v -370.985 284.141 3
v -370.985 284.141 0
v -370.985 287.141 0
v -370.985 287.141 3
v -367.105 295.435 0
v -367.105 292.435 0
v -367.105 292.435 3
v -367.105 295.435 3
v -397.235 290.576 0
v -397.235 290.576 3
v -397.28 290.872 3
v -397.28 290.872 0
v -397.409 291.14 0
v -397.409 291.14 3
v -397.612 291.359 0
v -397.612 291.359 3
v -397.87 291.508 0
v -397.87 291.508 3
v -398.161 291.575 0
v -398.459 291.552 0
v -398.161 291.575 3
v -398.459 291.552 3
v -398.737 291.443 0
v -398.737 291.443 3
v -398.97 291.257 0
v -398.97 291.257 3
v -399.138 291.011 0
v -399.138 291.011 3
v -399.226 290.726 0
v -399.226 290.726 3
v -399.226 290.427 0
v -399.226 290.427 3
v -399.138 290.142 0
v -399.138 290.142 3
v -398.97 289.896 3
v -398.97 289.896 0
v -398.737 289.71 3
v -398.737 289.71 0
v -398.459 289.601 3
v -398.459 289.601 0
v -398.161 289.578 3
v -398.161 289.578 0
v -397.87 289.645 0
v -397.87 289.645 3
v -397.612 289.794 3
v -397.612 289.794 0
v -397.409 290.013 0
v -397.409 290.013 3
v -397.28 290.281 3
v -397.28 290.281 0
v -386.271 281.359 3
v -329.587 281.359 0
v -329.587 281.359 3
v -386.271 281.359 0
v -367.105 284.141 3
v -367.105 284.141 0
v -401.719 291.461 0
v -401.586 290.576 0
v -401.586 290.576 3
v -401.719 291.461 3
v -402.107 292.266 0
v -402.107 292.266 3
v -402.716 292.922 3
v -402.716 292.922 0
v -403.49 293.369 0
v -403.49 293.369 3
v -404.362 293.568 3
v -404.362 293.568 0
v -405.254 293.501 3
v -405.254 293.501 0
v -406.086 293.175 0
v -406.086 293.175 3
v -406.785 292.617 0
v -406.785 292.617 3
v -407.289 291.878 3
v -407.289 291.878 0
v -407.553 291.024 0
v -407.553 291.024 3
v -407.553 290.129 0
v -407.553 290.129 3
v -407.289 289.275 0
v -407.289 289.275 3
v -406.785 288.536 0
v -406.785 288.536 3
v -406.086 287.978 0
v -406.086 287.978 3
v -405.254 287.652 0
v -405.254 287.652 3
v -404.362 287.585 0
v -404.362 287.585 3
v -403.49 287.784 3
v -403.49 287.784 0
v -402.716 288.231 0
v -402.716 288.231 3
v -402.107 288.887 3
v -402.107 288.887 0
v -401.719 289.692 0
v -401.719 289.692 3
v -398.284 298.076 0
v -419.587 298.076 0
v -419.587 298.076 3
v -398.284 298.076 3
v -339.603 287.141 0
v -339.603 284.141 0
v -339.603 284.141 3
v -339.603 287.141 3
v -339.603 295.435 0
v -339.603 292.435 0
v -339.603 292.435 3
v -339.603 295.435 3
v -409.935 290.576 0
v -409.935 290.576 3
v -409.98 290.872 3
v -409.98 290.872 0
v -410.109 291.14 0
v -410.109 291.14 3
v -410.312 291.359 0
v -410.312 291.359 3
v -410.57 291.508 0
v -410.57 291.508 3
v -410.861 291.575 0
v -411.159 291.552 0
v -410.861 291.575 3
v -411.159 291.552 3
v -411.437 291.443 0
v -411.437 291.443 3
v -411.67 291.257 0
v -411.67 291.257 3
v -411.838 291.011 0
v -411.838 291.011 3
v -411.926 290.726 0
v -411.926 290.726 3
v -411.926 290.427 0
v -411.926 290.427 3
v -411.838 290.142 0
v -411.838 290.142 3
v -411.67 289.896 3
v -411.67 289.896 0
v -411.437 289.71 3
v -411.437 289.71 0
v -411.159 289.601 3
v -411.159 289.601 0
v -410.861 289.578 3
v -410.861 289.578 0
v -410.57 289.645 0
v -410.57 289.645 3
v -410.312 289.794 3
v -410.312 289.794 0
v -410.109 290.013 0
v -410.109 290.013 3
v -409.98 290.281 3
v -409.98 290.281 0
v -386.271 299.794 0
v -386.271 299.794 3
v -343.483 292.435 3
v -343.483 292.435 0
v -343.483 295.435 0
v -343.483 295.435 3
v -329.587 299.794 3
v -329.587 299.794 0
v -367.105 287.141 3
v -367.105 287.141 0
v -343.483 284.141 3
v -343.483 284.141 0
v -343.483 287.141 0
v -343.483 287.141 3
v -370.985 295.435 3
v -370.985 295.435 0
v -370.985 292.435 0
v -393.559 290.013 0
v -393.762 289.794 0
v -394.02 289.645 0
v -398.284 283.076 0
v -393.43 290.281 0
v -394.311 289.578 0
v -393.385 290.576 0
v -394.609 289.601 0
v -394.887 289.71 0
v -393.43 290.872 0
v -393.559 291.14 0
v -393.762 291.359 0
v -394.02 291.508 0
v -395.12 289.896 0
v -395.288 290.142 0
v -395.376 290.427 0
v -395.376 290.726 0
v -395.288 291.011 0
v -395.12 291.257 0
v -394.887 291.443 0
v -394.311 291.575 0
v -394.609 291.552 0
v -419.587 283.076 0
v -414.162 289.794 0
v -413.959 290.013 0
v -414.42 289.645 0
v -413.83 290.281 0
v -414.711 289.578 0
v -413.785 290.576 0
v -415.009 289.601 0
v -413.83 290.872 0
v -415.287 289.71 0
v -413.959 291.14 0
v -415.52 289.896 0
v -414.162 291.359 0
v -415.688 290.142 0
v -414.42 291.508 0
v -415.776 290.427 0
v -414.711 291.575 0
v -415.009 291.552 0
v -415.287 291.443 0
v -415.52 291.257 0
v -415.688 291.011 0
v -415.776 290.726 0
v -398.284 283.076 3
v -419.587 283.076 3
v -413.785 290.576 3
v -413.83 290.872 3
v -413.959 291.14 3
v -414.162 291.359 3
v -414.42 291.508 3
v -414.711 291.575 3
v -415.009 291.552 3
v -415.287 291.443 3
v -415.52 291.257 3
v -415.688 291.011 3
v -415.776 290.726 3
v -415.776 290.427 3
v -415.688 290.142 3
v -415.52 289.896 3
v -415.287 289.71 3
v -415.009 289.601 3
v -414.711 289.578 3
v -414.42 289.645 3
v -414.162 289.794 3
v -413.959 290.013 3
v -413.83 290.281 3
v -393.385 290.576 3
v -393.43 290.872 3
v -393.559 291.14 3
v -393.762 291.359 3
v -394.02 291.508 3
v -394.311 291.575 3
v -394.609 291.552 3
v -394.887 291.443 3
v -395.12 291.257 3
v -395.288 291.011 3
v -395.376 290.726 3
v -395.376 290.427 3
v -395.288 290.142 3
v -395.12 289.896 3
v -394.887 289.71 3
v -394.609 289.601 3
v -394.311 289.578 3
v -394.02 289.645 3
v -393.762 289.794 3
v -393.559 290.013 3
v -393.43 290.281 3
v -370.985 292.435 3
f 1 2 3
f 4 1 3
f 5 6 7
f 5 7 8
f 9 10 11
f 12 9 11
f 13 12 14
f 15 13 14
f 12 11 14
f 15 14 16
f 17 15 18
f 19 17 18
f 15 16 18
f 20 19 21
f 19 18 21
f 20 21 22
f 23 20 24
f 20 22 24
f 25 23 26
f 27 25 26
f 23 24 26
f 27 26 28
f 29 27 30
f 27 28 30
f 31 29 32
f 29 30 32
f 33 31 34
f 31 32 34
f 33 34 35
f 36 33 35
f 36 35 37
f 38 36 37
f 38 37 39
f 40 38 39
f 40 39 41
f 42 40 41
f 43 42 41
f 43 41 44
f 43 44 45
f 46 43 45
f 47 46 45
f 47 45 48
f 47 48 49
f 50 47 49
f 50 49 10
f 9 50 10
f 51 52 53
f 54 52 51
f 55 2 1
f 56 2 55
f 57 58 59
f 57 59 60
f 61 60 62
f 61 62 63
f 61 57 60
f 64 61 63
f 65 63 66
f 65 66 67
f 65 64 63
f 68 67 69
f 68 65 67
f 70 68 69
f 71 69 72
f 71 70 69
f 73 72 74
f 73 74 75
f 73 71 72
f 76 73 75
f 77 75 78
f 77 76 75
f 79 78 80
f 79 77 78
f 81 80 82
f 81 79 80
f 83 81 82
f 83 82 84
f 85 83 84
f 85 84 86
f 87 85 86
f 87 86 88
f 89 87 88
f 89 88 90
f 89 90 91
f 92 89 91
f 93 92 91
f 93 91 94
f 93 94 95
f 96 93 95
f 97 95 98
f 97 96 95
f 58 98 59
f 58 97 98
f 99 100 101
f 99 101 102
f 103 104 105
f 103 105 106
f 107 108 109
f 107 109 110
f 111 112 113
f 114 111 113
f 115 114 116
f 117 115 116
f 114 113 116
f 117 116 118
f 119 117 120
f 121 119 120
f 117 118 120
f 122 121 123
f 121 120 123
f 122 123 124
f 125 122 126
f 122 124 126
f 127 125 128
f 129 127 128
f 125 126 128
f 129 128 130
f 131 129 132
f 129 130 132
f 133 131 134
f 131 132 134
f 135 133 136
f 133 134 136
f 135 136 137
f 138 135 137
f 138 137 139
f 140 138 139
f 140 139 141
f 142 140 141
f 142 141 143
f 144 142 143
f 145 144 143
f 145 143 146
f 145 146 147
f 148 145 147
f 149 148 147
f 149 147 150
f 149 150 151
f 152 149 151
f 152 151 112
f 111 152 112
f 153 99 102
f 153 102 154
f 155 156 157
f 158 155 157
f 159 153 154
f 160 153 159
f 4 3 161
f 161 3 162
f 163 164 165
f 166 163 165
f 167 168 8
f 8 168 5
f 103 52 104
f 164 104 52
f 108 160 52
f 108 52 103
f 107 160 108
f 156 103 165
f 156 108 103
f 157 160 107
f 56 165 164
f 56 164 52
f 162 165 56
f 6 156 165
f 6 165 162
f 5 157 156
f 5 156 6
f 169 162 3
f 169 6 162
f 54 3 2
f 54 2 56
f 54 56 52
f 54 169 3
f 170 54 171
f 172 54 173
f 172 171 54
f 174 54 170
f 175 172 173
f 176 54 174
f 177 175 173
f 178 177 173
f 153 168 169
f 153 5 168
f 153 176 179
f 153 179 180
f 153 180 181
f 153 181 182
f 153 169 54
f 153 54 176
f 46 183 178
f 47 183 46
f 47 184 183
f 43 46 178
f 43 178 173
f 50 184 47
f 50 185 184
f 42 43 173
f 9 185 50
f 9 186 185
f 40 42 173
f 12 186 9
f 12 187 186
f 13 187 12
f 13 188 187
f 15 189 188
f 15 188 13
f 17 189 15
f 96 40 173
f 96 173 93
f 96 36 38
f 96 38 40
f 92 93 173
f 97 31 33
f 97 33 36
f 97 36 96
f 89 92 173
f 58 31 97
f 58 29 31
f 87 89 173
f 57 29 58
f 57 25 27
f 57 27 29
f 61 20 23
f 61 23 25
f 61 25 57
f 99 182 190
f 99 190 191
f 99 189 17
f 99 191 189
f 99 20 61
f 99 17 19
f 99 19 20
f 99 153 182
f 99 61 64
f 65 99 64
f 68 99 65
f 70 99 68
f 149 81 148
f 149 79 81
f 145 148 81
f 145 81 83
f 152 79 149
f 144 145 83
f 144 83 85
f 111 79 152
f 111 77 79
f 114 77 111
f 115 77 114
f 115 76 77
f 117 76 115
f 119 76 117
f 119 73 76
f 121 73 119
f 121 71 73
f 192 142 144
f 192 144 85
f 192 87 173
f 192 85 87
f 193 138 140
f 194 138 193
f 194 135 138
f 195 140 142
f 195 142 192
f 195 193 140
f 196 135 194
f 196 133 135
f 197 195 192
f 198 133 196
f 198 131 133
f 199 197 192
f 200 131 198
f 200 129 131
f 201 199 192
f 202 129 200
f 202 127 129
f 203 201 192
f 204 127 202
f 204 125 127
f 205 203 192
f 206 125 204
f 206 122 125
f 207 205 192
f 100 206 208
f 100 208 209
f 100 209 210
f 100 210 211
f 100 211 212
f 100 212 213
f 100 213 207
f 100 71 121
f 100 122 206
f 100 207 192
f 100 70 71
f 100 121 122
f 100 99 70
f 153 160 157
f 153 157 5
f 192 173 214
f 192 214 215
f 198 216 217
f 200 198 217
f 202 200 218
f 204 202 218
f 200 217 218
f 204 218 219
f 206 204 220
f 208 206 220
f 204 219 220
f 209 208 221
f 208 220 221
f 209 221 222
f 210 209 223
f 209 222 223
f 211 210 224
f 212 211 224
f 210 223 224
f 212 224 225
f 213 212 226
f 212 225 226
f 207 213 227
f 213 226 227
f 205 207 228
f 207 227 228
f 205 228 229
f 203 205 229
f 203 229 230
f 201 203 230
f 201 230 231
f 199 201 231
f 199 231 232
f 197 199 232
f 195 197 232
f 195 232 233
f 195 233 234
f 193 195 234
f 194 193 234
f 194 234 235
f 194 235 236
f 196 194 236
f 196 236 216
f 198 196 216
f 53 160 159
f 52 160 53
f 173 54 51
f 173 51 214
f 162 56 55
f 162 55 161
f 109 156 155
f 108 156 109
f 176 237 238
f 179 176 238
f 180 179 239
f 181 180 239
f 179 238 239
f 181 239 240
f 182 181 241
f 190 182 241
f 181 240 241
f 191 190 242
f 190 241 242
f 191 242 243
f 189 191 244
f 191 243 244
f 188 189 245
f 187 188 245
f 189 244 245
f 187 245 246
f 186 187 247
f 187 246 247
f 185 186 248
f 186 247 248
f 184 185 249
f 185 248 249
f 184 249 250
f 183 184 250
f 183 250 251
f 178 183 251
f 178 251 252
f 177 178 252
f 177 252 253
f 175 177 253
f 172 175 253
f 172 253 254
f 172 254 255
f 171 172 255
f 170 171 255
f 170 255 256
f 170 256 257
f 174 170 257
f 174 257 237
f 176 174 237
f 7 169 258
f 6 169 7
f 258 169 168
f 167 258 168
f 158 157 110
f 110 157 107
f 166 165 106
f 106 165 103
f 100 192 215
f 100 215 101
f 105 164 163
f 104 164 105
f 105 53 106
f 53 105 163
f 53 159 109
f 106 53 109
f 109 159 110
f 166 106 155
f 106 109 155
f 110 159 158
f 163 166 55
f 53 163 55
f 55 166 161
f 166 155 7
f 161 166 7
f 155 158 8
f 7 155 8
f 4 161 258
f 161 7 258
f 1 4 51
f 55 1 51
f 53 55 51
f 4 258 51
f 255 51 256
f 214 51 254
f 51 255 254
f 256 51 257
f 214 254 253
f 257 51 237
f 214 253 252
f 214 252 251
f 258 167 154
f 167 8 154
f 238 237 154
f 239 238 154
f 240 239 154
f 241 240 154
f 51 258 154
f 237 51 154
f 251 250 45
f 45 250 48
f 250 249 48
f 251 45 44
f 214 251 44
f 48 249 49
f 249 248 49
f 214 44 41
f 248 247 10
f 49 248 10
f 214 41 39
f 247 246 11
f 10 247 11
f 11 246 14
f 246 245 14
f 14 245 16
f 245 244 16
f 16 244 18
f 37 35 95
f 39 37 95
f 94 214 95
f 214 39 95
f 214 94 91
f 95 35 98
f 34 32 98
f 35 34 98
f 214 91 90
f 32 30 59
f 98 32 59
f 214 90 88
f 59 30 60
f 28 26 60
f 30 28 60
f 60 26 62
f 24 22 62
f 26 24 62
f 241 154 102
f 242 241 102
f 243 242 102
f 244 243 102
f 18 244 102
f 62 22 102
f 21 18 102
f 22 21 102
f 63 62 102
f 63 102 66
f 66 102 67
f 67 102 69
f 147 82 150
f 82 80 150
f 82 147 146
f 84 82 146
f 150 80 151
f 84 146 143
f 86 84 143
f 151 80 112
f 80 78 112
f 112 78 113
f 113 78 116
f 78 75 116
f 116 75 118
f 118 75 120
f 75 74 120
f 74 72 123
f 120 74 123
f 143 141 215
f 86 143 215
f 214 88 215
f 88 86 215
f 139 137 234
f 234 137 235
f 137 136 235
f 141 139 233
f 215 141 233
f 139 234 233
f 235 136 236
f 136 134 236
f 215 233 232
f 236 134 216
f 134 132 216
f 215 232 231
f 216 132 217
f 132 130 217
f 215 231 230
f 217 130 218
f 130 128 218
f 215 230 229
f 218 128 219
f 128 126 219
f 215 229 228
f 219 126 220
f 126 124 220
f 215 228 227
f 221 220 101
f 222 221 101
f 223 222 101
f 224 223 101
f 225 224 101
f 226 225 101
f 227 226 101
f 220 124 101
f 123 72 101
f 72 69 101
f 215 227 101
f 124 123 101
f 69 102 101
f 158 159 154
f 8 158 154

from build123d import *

# Parameters (mm, degrees)
SKETCH1_R           = 3
SKETCH1_W           = 3.88
SKETCH1_H           = 3
BOSS_EXTRUDE1_DEPTH = 3
SKETCH2_R           = 1.0009
CUT_EXTRUDE1_DEPTH  = 516.692890771


with BuildPart() as part:
    # Sketch1 → Boss-Extrude1 (new body)
    with BuildSketch(Plane.XY):
        Polygon((-398.2841, 298.0765), (-386.271234014, 299.794262601), (-329.587365996, 299.794262601), (-329.587365996, 281.358737399), (-386.271234014, 281.358737399), (-398.2841, 283.0765), (-419.587365996, 283.0765), (-419.587365996, 298.0765), align=None)
        with Locations((-404.586054436, 290.5765)):
            Circle(SKETCH1_R, mode=Mode.SUBTRACT)
        with Locations((-369.044562351, 293.935134885)):
            Rectangle(SKETCH1_W, SKETCH1_H, mode=Mode.SUBTRACT)
        with Locations((-369.044562351, 285.640934885)):
            Rectangle(SKETCH1_W, SKETCH1_H, mode=Mode.SUBTRACT)
        with Locations((-341.542562351, 293.935134885)):
            Rectangle(SKETCH1_W, SKETCH1_H, mode=Mode.SUBTRACT)
        with Locations((-341.542562351, 285.640934885)):
            Rectangle(SKETCH1_W, SKETCH1_H, mode=Mode.SUBTRACT)
    extrude(amount=BOSS_EXTRUDE1_DEPTH)

    # Sketch2 → Cut-Extrude1 (cut, through all)
    with BuildSketch(Plane.XY.offset(3)):
        with Locations((-414.786054436, 290.5765)):
            Circle(SKETCH2_R)
        with Locations((-410.936054436, 290.5765)):
            Circle(SKETCH2_R)
        with Locations((-398.236054436, 290.5765)):
            Circle(SKETCH2_R)
        with Locations((-394.386054436, 290.5765)):
            Circle(SKETCH2_R)
    extrude(amount=-CUT_EXTRUDE1_DEPTH, mode=Mode.SUBTRACT)


solid = part.part
